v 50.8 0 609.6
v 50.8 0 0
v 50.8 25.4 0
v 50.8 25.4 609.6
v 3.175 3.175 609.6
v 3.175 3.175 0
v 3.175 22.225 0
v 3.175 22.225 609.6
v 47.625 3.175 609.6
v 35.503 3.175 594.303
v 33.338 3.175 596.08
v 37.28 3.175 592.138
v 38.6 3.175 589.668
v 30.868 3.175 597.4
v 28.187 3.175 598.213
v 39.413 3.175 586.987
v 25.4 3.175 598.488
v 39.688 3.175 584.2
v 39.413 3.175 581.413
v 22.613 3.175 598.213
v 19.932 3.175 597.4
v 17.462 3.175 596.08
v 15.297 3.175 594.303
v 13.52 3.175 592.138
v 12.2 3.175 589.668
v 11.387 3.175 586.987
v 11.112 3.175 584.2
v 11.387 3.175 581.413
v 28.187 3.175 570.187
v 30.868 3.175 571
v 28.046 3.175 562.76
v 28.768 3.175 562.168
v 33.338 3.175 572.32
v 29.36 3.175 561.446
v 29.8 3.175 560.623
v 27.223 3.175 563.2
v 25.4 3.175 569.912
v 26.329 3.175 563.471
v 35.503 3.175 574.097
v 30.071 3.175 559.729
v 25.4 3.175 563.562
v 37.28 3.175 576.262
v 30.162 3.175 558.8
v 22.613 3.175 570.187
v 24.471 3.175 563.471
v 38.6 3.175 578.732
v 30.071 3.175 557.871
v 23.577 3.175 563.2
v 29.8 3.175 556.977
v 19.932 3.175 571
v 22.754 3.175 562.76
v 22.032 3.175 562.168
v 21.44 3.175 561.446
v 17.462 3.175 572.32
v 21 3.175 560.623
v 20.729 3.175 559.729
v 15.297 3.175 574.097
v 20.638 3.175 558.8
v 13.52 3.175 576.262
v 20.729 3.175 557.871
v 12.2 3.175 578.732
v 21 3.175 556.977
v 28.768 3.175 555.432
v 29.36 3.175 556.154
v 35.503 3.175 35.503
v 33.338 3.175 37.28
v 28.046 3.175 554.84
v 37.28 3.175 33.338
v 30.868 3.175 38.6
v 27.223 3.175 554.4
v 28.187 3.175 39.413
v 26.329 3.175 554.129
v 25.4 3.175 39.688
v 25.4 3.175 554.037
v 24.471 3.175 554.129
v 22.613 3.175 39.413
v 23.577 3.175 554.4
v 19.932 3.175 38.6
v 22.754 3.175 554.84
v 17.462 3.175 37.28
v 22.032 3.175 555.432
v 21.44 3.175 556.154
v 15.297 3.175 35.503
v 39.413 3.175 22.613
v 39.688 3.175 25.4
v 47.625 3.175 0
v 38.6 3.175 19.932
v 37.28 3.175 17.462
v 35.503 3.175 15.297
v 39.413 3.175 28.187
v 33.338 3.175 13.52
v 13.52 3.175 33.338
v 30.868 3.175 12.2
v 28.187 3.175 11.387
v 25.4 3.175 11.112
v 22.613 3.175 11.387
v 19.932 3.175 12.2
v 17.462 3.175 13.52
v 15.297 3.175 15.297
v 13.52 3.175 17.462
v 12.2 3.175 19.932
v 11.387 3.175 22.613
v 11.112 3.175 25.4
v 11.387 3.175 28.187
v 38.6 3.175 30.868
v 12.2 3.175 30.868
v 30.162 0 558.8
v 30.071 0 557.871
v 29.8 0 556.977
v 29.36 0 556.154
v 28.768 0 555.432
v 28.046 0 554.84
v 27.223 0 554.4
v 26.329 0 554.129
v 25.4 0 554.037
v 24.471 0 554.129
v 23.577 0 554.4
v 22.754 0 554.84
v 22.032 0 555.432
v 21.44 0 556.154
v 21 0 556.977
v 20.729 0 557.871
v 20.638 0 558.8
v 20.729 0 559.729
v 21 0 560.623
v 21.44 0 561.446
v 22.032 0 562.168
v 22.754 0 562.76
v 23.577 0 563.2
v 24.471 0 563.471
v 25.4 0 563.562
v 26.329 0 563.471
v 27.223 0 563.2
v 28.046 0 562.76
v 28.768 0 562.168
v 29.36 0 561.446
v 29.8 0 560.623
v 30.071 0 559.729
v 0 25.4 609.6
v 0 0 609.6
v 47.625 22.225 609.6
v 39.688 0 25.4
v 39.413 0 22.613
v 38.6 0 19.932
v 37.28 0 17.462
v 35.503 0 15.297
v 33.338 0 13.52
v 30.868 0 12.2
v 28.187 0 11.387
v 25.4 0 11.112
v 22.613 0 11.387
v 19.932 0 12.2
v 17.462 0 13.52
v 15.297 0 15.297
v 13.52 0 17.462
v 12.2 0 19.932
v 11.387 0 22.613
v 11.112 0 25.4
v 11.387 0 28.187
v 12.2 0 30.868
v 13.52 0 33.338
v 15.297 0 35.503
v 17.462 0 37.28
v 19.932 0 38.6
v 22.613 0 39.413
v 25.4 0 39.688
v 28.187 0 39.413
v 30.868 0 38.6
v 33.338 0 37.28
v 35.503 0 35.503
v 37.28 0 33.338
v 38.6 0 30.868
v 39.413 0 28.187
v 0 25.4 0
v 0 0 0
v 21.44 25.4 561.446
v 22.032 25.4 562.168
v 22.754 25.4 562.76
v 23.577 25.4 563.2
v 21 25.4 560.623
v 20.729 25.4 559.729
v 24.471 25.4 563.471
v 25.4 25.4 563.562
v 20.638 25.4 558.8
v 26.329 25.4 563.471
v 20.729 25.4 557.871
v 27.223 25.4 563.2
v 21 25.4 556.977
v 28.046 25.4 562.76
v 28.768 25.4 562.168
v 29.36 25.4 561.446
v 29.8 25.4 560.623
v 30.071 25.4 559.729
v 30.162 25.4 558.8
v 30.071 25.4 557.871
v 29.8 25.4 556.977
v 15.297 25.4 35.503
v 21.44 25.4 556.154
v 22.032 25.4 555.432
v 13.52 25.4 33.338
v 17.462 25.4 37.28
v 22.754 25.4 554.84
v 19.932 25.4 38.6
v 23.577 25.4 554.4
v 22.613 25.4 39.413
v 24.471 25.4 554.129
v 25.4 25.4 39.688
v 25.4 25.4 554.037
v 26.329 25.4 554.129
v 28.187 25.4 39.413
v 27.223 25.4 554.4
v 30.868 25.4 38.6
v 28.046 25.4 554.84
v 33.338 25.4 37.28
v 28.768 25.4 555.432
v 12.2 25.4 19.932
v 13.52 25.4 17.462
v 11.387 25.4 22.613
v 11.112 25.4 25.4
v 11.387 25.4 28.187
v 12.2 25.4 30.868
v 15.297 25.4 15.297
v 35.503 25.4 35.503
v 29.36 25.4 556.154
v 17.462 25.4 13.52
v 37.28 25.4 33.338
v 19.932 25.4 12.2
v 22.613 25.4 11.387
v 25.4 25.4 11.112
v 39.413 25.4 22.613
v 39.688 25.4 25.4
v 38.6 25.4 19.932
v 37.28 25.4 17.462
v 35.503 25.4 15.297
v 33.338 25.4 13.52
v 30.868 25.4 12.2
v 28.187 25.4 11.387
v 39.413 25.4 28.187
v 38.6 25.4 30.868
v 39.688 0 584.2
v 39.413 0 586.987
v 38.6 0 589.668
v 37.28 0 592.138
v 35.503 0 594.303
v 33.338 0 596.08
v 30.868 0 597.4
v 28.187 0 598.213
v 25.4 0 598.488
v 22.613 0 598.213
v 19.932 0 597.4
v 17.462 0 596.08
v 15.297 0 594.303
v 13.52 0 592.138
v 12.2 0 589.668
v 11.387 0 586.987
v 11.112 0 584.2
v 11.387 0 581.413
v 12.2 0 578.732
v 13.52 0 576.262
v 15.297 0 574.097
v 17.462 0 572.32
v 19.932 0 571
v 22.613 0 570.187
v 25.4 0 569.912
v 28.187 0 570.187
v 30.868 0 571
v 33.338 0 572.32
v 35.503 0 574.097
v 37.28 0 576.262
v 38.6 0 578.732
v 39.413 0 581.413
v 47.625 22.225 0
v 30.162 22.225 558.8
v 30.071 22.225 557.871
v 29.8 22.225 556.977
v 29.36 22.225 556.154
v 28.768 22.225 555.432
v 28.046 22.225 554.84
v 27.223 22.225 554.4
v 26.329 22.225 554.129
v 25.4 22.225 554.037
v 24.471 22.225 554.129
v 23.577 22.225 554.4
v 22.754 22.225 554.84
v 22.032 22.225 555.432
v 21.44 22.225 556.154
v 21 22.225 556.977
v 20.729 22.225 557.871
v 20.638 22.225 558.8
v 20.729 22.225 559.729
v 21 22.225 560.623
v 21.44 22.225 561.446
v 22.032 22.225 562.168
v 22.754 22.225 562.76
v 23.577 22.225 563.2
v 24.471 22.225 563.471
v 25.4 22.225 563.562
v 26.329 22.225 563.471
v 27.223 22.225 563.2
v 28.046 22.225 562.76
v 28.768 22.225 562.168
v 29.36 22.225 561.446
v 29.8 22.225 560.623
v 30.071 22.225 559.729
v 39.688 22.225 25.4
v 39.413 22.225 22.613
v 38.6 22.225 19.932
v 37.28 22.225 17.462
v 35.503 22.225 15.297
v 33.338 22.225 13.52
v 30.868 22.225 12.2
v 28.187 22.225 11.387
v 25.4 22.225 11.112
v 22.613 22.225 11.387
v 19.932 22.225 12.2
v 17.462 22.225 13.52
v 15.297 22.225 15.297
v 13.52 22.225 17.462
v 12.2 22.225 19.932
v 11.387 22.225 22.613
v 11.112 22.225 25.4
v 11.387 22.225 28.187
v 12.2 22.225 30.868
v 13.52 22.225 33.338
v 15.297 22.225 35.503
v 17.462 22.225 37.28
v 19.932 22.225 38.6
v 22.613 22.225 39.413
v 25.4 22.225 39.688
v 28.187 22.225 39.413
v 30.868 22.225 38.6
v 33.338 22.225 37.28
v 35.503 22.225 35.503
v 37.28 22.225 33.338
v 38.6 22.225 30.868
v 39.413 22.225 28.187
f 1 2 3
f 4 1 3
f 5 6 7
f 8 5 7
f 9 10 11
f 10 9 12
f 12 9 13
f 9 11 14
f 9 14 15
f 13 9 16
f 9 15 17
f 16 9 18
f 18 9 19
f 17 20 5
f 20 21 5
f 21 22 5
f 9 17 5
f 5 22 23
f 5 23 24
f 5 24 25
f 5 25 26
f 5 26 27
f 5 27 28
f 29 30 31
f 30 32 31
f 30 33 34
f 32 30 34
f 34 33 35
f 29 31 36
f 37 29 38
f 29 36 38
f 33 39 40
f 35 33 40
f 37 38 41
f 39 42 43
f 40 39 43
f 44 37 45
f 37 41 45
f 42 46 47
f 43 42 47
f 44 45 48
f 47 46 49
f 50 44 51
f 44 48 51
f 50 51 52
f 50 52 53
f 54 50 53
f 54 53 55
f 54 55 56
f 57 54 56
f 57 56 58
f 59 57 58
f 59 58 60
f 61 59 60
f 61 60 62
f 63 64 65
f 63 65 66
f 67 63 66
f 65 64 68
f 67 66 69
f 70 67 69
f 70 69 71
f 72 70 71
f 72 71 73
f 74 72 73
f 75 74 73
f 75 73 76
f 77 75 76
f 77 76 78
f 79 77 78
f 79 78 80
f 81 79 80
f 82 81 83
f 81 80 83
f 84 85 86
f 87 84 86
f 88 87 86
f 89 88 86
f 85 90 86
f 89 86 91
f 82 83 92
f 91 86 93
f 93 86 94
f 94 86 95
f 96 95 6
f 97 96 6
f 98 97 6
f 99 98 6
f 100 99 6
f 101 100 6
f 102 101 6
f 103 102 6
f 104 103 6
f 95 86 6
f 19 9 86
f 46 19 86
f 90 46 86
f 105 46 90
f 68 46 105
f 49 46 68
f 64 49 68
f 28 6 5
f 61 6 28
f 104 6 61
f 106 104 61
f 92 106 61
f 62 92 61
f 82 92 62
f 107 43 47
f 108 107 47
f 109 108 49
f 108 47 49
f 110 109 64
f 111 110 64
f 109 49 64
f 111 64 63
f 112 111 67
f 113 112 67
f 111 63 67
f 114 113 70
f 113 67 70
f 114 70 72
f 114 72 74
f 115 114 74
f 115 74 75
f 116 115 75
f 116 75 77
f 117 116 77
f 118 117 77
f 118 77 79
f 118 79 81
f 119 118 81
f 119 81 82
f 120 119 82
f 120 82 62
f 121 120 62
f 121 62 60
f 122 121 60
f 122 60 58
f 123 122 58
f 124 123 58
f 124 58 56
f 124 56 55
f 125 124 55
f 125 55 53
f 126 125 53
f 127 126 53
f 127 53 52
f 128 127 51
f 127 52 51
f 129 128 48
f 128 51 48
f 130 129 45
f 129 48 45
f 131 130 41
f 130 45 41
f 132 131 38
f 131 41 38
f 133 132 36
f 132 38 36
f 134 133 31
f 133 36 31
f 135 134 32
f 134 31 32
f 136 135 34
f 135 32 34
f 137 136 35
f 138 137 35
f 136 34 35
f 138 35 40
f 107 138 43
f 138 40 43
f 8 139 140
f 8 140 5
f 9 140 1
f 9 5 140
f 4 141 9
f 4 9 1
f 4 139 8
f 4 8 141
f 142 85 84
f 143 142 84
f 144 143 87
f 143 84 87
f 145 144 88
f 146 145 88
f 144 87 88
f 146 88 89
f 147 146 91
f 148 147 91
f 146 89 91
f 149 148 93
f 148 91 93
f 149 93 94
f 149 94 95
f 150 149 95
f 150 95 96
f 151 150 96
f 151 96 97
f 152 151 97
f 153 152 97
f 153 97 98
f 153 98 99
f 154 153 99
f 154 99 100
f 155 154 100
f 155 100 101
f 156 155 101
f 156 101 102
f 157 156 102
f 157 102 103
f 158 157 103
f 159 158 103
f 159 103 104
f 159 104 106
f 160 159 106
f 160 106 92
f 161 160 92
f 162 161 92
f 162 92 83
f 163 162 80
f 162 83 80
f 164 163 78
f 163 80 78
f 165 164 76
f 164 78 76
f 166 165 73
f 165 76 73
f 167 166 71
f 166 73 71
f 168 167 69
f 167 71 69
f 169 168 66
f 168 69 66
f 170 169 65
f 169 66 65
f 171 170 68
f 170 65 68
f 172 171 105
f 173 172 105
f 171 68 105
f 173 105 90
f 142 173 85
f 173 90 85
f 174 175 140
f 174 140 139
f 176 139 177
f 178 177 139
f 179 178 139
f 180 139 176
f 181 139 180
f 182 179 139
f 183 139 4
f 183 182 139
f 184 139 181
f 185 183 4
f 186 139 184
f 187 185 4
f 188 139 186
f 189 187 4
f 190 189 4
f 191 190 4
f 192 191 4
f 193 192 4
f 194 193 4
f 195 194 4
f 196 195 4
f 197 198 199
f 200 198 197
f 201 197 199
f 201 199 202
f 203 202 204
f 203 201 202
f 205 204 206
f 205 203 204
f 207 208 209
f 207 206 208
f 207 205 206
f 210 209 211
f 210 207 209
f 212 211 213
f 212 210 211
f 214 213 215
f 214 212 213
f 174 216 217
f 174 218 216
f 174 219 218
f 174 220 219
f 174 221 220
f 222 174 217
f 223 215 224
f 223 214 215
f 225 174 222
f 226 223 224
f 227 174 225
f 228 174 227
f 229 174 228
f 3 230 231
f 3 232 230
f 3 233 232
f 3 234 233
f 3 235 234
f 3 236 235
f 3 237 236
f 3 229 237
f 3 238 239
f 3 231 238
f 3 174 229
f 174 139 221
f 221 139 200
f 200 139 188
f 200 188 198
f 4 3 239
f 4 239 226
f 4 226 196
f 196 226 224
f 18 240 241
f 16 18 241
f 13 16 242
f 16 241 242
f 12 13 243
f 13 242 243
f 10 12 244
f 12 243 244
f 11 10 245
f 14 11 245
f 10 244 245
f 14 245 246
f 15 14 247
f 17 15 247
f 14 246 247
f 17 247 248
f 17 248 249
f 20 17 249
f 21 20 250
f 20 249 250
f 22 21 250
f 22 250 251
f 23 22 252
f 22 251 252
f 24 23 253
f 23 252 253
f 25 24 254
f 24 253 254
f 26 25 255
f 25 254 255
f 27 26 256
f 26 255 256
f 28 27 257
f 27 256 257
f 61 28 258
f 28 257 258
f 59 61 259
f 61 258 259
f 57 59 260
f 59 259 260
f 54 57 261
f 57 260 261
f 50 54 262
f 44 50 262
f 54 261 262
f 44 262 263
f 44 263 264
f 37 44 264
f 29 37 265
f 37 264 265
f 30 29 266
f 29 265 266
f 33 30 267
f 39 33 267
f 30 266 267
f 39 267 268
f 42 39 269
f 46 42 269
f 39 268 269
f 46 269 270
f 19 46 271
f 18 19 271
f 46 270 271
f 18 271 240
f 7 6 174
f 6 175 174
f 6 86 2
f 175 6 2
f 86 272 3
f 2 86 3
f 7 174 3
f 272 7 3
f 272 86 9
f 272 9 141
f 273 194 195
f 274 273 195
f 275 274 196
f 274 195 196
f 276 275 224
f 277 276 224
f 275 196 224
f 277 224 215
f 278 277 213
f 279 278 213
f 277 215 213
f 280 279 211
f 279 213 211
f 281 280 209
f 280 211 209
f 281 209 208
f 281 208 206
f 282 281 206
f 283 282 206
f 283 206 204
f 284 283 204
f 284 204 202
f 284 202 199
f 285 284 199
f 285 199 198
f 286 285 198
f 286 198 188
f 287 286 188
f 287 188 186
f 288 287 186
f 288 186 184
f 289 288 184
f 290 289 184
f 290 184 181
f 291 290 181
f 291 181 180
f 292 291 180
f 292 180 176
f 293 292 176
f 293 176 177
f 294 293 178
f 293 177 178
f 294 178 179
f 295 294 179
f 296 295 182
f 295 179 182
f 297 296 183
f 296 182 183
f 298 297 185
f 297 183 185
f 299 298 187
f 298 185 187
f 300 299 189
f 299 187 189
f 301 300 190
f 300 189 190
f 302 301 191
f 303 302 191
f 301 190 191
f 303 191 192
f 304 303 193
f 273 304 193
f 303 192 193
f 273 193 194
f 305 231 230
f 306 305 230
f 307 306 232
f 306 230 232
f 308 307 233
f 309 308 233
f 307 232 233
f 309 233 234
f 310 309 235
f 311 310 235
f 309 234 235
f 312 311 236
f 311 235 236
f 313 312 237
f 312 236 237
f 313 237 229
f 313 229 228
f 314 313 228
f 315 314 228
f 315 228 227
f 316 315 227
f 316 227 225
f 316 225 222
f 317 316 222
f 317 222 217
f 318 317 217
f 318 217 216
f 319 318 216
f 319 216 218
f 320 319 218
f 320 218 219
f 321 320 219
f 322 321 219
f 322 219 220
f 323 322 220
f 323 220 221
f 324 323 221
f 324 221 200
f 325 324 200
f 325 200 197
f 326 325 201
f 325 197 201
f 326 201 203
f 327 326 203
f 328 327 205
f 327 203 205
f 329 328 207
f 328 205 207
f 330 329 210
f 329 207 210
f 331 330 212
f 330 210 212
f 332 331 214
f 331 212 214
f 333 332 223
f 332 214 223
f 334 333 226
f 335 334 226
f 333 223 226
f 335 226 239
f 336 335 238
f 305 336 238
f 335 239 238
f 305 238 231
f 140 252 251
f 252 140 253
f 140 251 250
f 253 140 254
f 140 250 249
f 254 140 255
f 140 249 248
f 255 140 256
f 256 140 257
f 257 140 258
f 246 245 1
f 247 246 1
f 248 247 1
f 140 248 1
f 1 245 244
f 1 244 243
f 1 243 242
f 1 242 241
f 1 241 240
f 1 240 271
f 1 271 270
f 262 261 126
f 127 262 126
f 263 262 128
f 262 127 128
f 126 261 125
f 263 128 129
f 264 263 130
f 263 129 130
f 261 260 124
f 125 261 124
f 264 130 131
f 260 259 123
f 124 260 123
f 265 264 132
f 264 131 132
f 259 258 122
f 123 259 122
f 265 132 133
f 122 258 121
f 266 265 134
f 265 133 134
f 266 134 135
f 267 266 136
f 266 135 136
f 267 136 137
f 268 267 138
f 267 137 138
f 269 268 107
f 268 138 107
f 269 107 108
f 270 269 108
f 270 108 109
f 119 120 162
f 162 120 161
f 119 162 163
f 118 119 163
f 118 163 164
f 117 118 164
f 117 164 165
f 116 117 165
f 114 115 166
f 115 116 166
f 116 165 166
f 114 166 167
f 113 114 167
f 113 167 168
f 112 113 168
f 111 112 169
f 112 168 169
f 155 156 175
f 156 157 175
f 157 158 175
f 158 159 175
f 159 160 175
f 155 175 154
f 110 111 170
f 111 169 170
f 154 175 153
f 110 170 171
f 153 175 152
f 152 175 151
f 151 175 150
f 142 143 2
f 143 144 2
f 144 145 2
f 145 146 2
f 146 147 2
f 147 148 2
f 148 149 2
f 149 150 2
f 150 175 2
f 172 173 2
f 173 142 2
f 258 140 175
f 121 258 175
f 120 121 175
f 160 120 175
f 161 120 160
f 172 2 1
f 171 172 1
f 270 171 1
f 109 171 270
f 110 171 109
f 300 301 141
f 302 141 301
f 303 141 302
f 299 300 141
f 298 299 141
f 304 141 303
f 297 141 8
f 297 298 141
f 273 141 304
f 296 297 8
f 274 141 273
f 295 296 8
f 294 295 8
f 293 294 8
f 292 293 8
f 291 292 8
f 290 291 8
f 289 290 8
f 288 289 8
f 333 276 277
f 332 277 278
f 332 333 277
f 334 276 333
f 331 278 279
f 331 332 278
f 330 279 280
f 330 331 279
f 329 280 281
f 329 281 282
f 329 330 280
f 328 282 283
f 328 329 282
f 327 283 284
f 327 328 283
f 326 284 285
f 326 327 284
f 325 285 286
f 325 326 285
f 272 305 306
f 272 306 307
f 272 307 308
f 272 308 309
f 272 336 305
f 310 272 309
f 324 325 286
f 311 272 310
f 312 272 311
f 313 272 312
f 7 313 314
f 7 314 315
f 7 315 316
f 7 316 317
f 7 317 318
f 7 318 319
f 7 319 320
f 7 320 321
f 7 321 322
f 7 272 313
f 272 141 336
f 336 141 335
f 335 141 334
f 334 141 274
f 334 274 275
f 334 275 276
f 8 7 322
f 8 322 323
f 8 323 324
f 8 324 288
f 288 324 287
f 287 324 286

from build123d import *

# Parameters (mm, degrees)
SKETCH1_W           = 50.8
SKETCH1_H           = 25.4
BOSS_EXTRUDE1_DEPTH = 609.6
SKETCH2_W           = 44.45
SKETCH2_H           = 19.05
CUT_EXTRUDE1_DEPTH  = 635
SKETCH6_R           = 14.2875
CUT_EXTRUDE5_DEPTH  = 25.4
SKETCH7_R           = 14.2875
CUT_EXTRUDE6_DEPTH  = 3.175
SKETCH8_R           = 4.7625
CUT_EXTRUDE7_DEPTH  = 25.4


with BuildPart() as part:
    # Sketch1 → Boss-Extrude1 (new body)
    with BuildSketch(Plane.XY):
        with Locations((25.4, 12.7)):
            Rectangle(SKETCH1_W, SKETCH1_H)
    extrude(amount=BOSS_EXTRUDE1_DEPTH)

    # Sketch2 → Cut-Extrude1 (cut)
    with BuildSketch(Plane(origin=(0, 0, 0), x_dir=(-1, 0, 0), z_dir=(0, 0, -1))):
        with Locations((-25.4, 12.7)):
            Rectangle(SKETCH2_W, SKETCH2_H)
    extrude(amount=-CUT_EXTRUDE1_DEPTH, mode=Mode.SUBTRACT)

    # Sketch6 → Cut-Extrude5 (cut)
    with BuildSketch(Plane(origin=(0, 25.4, 0), x_dir=(1, 0, 0), z_dir=(0, 1, 0))):
        with Locations((25.4, -25.4)):
            Circle(SKETCH6_R)
    extrude(amount=-CUT_EXTRUDE5_DEPTH, mode=Mode.SUBTRACT)

    # Sketch7 → Cut-Extrude6 (cut)
    with BuildSketch(Plane.XZ):
        with Locations((25.4, 584.2)):
            Circle(SKETCH7_R)
    extrude(amount=-CUT_EXTRUDE6_DEPTH, mode=Mode.SUBTRACT)

    # Sketch8 → Cut-Extrude7 (cut)
    with BuildSketch(Plane(origin=(0, 25.4, 0), x_dir=(1, 0, 0), z_dir=(0, 1, 0))):
        with Locations((25.4, -558.8)):
            Circle(SKETCH8_R)
    extrude(amount=-CUT_EXTRUDE7_DEPTH, mode=Mode.SUBTRACT)


solid = part.part
